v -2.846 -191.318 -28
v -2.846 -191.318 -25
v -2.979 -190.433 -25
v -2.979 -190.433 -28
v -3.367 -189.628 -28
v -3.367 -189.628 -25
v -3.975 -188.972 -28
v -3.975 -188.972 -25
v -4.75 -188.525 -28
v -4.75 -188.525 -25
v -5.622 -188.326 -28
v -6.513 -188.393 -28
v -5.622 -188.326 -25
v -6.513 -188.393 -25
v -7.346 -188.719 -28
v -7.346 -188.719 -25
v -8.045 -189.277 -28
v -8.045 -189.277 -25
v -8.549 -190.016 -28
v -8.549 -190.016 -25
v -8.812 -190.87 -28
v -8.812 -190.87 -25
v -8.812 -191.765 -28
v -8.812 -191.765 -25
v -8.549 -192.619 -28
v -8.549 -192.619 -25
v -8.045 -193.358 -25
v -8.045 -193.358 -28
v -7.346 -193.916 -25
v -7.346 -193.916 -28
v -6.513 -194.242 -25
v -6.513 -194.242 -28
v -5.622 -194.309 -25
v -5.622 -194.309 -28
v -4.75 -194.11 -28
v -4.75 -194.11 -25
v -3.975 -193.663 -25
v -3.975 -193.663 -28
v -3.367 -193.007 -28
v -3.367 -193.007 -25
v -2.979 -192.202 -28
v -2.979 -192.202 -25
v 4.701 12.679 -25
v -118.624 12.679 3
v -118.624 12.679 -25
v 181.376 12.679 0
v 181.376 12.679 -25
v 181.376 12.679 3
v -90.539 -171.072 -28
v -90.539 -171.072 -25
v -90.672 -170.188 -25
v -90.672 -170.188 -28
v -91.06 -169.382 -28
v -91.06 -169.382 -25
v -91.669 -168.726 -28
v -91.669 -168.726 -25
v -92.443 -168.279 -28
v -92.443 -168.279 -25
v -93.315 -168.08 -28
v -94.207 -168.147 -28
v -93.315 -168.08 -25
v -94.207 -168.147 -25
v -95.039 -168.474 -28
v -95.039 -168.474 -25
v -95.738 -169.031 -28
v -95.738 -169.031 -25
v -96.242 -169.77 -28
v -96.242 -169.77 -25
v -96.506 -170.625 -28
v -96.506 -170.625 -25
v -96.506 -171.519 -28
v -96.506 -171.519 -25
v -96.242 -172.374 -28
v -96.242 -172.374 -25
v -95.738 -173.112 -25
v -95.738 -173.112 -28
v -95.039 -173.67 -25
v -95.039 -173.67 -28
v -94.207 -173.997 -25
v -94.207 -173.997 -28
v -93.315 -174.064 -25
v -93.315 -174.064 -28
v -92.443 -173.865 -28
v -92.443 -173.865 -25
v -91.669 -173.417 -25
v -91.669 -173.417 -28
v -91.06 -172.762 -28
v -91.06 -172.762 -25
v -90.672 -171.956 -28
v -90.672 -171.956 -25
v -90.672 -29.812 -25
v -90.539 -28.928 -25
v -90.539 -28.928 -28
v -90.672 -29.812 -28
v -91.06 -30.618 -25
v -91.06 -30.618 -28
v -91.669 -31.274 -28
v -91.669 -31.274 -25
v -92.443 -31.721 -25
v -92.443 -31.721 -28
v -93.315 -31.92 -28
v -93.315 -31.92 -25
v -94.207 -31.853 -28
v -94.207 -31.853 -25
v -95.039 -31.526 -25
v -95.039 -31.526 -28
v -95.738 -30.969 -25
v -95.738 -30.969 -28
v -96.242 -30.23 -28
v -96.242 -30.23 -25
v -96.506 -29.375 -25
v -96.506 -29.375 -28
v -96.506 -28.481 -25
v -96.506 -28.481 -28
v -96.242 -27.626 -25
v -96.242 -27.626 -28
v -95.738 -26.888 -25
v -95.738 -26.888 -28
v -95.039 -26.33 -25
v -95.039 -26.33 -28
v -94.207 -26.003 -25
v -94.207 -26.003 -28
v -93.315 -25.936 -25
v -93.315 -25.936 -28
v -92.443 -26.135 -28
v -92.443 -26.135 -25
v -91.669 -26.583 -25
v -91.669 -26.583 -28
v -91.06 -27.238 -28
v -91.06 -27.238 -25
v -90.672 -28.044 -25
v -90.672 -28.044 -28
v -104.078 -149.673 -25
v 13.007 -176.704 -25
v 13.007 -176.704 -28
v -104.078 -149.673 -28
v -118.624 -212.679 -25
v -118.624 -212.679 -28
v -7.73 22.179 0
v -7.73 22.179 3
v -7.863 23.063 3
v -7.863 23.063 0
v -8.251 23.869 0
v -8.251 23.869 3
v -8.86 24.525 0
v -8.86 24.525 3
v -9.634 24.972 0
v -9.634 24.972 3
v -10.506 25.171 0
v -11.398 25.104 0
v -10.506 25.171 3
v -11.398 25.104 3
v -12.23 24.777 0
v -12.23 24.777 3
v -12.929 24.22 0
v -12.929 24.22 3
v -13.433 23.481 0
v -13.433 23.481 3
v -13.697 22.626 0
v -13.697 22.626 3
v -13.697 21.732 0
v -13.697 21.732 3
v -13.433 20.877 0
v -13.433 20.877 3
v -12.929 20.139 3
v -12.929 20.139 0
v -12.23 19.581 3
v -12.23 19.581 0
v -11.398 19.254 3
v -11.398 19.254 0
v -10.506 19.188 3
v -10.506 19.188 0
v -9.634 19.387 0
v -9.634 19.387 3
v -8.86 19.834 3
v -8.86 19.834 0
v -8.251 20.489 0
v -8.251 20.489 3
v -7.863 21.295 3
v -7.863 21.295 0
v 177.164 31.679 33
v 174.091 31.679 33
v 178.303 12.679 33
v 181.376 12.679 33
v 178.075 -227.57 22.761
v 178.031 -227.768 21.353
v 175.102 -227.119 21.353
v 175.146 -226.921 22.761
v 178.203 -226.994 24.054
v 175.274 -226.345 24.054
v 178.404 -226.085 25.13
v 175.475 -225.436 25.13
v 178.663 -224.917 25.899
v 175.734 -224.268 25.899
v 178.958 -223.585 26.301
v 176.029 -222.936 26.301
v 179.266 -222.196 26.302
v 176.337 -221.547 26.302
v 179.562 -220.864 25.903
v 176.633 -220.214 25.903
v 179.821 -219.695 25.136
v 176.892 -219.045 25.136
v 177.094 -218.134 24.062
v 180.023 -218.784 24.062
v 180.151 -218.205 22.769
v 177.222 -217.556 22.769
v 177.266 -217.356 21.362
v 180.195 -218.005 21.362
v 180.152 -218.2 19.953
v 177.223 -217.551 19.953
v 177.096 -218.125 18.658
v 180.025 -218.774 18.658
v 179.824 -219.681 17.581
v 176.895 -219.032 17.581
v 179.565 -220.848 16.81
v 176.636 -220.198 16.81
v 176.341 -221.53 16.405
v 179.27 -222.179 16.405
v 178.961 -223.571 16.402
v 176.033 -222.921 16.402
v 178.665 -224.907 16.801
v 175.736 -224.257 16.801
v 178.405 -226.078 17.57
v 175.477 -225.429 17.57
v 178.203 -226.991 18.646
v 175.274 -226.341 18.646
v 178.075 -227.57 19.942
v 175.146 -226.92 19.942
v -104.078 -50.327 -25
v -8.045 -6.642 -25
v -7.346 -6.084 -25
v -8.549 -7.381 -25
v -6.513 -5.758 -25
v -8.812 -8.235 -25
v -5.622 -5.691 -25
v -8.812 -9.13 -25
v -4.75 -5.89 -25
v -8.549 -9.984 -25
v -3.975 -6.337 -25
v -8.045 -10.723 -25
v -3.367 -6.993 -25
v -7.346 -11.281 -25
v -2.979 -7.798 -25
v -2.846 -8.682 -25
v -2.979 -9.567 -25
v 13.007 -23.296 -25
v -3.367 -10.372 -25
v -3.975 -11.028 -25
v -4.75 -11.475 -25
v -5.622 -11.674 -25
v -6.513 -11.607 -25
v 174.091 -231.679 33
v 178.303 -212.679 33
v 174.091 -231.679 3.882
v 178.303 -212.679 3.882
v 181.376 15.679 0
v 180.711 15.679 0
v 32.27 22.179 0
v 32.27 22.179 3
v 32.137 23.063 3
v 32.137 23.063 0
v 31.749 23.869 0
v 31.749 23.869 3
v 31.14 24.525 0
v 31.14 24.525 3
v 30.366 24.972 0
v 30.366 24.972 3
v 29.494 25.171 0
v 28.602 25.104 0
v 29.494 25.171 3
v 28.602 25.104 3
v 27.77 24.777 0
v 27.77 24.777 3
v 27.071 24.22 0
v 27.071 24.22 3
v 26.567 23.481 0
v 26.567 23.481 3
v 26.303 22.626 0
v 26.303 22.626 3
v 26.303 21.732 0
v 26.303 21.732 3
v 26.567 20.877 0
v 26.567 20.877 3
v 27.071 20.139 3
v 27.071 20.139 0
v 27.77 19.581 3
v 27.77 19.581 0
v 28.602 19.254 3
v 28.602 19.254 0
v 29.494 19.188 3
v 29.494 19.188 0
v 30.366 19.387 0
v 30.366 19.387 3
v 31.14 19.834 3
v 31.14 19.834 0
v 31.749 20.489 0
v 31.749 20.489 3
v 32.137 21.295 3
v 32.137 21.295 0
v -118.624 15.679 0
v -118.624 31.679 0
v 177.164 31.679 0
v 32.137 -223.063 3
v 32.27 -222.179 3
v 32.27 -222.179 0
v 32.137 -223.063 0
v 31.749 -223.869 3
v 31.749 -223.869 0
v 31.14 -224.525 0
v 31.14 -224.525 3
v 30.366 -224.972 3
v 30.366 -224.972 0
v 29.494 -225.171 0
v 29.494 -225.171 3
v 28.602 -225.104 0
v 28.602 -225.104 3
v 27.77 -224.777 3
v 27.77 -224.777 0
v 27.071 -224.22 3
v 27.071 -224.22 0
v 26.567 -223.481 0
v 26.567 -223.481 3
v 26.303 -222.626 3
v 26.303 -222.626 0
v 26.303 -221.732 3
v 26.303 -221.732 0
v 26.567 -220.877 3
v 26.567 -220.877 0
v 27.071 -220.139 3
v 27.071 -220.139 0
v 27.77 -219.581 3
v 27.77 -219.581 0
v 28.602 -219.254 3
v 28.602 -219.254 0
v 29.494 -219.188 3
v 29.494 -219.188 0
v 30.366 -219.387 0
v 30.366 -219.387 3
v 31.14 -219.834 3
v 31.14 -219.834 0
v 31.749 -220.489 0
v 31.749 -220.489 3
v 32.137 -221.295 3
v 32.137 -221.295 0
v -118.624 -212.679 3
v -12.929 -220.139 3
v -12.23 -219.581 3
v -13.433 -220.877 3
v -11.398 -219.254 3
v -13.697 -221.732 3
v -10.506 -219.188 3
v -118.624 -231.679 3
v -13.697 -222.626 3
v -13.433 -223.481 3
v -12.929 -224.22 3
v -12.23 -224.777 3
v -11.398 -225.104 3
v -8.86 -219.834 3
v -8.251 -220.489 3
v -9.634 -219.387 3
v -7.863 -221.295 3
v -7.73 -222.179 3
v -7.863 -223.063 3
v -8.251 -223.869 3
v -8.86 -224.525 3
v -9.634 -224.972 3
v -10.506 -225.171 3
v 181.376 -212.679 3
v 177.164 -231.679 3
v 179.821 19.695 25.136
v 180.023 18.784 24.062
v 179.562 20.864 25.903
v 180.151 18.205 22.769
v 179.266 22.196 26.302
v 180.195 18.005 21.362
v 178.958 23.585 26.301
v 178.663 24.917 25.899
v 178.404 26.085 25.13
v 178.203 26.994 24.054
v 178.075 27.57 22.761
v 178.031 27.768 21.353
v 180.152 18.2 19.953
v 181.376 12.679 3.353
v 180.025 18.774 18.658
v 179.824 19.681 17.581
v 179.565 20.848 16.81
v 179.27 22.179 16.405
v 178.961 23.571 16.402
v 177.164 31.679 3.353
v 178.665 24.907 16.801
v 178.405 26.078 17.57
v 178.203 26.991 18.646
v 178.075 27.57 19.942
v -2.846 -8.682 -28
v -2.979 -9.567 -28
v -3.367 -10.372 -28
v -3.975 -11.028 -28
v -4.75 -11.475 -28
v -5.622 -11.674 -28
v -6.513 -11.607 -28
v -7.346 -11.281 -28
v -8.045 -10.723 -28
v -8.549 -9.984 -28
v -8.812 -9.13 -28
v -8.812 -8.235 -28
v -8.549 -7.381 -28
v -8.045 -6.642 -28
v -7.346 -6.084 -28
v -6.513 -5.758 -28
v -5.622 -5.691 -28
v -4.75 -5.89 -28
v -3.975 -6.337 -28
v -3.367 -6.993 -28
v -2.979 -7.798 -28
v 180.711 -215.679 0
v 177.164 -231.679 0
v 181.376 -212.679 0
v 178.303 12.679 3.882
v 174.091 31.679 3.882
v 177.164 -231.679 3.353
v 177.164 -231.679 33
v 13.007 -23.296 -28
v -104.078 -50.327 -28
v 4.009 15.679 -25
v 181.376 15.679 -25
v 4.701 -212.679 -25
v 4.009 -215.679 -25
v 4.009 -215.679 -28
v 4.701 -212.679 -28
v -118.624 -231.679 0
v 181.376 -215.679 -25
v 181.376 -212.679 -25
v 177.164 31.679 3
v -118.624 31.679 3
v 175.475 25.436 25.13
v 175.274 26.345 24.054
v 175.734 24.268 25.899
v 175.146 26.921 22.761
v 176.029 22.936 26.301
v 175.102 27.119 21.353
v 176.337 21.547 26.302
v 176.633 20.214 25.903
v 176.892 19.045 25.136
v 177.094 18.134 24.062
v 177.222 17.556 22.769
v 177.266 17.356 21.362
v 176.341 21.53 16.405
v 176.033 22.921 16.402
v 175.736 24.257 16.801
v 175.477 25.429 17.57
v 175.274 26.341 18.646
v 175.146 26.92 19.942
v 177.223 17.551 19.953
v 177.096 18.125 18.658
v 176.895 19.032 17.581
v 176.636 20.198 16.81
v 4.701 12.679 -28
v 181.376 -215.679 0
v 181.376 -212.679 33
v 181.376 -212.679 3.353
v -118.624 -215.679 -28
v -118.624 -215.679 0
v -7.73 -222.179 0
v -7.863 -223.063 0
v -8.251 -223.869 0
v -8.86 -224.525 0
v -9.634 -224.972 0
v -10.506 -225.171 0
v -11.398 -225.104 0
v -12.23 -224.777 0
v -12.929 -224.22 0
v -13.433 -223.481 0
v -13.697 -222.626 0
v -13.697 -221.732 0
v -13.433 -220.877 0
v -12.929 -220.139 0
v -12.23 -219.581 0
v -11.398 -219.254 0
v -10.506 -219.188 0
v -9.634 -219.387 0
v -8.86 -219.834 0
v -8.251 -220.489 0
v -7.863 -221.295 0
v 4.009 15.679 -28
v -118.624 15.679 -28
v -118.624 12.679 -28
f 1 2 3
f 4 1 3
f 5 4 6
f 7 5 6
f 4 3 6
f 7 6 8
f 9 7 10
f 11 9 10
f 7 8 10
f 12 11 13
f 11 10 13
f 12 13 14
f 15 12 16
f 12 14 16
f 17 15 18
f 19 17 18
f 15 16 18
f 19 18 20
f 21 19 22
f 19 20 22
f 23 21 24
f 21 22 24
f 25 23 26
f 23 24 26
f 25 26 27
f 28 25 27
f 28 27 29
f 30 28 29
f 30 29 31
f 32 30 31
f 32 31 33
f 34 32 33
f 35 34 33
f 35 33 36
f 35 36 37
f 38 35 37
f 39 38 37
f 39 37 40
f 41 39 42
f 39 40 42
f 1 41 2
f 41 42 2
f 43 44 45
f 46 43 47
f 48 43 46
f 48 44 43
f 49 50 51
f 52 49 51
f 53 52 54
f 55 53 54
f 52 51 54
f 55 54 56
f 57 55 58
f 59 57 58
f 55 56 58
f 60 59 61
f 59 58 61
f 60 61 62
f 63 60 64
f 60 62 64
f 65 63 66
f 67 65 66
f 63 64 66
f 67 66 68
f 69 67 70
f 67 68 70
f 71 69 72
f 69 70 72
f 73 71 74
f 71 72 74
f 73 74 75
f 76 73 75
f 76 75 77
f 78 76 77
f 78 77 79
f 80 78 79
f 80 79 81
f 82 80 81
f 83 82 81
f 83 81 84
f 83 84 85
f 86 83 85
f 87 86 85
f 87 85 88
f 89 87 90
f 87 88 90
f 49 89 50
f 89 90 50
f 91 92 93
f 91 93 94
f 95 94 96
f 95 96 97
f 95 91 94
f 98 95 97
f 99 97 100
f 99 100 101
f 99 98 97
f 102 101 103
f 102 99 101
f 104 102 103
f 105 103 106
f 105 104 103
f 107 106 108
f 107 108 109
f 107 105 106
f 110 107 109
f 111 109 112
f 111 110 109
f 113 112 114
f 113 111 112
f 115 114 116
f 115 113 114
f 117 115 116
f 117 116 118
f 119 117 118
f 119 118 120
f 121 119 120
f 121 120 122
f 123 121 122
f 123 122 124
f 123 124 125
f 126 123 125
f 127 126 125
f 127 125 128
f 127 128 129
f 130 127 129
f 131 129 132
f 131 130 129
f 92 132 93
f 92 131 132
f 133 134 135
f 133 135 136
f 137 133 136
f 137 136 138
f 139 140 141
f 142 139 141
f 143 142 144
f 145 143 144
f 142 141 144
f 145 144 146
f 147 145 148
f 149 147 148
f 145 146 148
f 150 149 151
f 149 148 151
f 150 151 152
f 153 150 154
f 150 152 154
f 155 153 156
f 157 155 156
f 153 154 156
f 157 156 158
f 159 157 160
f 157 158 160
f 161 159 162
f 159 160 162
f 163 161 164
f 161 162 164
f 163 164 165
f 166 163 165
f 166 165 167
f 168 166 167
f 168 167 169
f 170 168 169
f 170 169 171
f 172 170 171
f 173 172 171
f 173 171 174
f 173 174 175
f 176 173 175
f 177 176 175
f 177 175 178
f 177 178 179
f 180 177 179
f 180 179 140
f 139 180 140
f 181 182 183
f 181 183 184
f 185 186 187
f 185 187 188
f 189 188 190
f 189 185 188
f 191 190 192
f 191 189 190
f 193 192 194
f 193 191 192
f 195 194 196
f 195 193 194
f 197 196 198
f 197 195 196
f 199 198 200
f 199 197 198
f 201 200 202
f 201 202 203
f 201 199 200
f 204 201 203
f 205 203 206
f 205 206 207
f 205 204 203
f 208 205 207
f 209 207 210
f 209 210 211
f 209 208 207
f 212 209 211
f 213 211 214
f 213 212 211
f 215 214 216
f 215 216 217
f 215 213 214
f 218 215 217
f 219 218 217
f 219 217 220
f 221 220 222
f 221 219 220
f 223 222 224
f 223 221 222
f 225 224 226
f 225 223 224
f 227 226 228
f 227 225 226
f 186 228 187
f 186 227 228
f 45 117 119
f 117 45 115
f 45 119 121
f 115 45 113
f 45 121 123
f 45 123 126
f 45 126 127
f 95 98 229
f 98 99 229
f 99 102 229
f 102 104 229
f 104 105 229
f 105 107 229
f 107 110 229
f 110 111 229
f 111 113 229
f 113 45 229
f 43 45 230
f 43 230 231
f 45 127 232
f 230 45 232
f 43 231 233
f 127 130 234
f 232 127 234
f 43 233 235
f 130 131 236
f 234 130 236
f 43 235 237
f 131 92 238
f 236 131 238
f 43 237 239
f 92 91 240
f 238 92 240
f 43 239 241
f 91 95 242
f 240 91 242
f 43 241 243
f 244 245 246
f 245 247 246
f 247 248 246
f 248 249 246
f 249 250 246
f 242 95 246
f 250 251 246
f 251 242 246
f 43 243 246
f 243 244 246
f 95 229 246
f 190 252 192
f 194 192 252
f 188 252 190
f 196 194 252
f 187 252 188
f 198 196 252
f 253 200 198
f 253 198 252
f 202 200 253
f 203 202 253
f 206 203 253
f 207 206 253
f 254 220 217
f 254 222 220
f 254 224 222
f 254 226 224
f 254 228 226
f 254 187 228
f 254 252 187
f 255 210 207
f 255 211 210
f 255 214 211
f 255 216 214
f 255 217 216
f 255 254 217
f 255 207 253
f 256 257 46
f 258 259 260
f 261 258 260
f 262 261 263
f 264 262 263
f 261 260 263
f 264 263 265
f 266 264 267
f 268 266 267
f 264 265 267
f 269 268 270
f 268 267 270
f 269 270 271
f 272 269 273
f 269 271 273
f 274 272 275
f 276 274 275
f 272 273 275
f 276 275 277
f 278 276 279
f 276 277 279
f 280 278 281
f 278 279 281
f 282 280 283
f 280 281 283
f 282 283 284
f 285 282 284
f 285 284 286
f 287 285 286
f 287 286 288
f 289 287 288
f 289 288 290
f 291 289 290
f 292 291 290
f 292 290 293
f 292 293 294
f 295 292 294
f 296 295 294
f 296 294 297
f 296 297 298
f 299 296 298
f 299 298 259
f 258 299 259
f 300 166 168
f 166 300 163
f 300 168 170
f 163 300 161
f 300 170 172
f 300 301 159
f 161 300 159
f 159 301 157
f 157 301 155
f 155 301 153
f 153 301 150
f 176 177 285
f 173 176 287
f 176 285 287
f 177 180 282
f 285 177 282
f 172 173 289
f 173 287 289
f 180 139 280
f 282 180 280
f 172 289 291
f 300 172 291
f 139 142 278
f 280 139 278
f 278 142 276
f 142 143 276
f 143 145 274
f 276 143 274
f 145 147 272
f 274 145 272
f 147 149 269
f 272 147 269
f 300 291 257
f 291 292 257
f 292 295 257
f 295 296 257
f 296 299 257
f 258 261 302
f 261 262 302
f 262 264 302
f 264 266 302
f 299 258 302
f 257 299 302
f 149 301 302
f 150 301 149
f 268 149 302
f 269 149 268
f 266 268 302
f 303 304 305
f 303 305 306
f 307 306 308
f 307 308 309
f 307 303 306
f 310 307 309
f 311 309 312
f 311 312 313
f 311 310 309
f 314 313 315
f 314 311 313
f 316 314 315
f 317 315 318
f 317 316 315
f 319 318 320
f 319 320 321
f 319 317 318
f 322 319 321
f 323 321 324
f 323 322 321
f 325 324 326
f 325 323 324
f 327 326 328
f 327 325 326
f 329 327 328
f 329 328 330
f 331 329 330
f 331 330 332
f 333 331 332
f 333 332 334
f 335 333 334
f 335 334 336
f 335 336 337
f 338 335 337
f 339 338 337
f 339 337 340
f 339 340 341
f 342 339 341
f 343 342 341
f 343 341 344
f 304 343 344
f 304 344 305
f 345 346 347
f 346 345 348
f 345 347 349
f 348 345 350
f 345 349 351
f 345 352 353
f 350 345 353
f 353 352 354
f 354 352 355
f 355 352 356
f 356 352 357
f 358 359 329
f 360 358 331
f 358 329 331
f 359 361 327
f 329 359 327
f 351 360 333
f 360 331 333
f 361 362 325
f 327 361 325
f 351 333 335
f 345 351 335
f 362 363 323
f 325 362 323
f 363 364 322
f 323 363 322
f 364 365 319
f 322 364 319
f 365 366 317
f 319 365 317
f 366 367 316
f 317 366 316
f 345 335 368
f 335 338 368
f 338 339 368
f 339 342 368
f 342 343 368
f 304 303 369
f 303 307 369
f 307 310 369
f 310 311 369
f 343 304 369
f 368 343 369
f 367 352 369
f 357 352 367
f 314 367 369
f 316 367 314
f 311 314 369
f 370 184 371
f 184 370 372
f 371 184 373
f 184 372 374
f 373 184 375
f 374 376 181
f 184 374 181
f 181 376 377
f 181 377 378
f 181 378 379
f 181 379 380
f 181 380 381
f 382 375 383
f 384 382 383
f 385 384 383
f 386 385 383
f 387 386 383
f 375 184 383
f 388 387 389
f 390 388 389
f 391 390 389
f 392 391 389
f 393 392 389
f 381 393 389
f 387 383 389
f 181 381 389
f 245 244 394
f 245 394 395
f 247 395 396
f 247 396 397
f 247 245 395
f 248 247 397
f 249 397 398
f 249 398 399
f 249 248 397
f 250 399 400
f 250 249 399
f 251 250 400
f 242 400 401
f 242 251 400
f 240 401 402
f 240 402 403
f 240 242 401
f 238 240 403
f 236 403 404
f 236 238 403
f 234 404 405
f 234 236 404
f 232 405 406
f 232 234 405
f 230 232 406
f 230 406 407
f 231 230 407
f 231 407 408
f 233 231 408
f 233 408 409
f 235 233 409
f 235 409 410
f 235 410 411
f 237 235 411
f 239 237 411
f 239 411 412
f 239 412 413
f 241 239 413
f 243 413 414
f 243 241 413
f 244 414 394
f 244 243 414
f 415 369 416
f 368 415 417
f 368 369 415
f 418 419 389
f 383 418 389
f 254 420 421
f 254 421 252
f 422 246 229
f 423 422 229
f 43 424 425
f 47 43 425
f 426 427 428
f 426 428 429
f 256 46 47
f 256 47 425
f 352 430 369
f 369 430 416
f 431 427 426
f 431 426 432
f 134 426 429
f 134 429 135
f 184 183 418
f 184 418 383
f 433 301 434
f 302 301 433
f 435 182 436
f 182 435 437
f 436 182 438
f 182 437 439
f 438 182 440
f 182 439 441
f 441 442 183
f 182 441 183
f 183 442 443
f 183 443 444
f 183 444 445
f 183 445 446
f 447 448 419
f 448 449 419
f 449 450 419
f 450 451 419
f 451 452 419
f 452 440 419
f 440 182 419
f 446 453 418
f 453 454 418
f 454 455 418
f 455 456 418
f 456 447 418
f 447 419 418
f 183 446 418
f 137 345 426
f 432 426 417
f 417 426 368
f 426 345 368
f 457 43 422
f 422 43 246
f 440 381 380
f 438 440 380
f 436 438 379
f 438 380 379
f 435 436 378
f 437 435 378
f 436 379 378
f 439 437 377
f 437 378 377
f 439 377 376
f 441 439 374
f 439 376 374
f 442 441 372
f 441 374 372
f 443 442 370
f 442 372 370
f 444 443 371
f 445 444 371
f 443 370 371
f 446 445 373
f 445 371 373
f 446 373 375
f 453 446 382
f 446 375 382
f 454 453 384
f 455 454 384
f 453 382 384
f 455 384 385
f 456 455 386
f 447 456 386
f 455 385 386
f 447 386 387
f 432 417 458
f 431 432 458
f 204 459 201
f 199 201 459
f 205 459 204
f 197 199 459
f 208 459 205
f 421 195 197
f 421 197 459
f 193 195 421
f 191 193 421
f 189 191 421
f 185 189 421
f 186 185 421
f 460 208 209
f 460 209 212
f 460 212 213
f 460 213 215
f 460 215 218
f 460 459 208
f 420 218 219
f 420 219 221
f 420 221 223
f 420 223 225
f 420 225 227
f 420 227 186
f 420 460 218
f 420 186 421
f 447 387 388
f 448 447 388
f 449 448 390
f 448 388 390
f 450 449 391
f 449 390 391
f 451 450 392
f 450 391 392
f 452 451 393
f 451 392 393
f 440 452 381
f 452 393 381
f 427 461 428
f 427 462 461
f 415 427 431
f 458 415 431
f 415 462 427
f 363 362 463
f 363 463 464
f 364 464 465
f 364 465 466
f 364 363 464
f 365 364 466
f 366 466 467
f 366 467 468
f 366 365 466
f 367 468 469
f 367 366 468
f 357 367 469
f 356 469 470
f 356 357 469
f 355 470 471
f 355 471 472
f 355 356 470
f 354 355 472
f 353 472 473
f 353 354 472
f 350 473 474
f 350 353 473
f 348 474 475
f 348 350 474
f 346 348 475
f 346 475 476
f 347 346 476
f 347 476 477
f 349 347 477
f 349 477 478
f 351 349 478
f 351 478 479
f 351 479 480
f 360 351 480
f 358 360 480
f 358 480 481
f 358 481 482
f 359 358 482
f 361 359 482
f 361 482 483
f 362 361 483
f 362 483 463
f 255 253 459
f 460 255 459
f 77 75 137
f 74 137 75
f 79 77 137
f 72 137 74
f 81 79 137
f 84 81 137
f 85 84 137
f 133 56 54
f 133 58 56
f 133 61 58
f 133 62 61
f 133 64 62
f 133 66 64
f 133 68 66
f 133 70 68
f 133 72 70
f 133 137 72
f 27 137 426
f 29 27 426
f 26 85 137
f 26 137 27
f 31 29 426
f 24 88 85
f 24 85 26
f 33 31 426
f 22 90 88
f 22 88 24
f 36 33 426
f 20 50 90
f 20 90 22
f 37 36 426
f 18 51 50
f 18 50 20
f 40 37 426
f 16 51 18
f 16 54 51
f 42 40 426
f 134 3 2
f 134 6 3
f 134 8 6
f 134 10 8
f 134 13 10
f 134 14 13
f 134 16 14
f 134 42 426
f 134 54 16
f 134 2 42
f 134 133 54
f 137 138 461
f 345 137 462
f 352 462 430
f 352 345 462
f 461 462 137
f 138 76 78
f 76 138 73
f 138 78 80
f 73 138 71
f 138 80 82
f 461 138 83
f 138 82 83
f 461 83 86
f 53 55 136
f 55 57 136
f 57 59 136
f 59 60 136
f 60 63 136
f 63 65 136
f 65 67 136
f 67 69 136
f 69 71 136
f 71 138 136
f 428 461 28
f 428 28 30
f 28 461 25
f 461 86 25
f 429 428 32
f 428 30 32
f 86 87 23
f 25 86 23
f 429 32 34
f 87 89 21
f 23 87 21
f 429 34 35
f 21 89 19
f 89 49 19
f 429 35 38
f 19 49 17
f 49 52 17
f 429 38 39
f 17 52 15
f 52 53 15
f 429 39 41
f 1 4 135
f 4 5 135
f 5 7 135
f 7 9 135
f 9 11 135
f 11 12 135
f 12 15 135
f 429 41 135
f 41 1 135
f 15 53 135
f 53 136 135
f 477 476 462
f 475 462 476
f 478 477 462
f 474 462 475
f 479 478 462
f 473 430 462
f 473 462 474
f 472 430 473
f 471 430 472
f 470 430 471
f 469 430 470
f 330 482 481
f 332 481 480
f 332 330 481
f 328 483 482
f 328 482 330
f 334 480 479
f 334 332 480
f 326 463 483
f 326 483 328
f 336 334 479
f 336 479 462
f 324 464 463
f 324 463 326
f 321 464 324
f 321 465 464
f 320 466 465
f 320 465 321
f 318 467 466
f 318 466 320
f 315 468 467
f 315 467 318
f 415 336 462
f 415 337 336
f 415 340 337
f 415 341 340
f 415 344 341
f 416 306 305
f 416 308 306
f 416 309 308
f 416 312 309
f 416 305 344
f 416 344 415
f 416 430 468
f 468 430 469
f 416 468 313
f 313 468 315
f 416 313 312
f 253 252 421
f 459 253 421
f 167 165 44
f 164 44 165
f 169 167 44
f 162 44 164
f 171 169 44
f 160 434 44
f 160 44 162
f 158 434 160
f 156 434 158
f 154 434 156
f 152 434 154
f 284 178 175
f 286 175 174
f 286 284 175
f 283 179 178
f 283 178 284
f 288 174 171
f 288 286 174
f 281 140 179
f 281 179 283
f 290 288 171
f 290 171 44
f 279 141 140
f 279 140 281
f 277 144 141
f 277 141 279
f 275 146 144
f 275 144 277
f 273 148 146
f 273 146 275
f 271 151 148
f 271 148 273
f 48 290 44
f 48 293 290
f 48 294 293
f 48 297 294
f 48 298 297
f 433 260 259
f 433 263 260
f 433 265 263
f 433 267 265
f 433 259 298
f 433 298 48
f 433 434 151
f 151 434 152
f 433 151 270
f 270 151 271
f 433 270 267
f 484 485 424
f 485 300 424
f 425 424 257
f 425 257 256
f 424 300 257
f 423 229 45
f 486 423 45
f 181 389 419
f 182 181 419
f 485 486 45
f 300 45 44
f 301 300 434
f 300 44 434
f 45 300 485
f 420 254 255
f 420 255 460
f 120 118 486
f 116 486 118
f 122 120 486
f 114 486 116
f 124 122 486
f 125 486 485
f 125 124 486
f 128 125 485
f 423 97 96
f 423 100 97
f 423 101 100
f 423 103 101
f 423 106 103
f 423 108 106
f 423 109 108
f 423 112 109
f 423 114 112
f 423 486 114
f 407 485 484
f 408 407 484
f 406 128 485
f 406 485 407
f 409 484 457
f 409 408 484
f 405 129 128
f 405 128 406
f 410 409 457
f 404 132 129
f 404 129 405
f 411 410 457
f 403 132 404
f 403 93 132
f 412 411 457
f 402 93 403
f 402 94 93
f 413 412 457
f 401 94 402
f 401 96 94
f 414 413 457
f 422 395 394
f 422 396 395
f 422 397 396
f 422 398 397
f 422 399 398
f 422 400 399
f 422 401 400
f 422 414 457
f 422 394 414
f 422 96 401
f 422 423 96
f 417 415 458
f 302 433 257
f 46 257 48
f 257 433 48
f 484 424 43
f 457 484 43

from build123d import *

# Parameters (mm, degrees)
F0_W        = 300
F0_H        = 16
F0_H_2      = 3
F1_DEPTH    = 3
F3_DEPTH    = 3.001
F5_DEPTH    = 30
F6_T1_DEPTH = 45.4466987362
F8_DEPTH    = 292.889802136
F10_DEPTH   = 25
F11_R       = 3
F12_DEPTH   = 3
F4_R        = 3
F13_DEPTH   = 31.001


# Not quite as in the source:
# - a fillet or chamfer that OpenCascade refuses, or shapes differently, is made with other operations: its cross-section is extruded or revolved along the edge and cut away or added


with BuildPart() as f1:
    # F0 (on Top) → F1 (new body)
    with BuildSketch(Plane.XY):
        with Locations((31.376008536, 23.679145366)):
            Rectangle(F0_W, F0_H)
        with Locations((31.376008536, 14.179145366)):
            Rectangle(F0_W, F0_H_2)
    extrude(amount=F1_DEPTH)

    # F2 (on face) → F3 (cut, through all)
    with BuildSketch(Plane.XY.offset(3)):
        Polygon((181.376008536, 31.679145366), (177.1638099458, 31.679145366), (181.376008536, 12.679145366), align=None)
    extrude(amount=-F3_DEPTH, mode=Mode.SUBTRACT)

    # F0 (on Top) → F10 (join)
    with BuildSketch(Plane.XY):
        with Locations((31.376008536, 14.179145366)):
            Rectangle(F0_W, F0_H_2)
    extrude(amount=-F10_DEPTH)

    # F11 (on face) → F12 (join)
    with BuildSketch(Plane(origin=(0, 0, -25), x_dir=(1, 0, 0), z_dir=(0, 0, -1))):
        Polygon((-104.0779183868, 50.3268192335), (-118.623991464, -12.679145366), (4.7014701045, -12.679145366), (13.0069077049, 23.2956572255), align=None)
        with Locations((-5.8458569022, 8.6824761846)):
            Circle(F11_R, mode=Mode.SUBTRACT)
        with Locations((-93.5391627328, 28.9280710755)):
            Circle(F11_R, mode=Mode.SUBTRACT)
        Polygon((4.7014701045, -12.679145366), (-118.623991464, -12.679145366), (-118.623991464, -15.679145366), (4.0088655312, -15.679145366), align=None)
    extrude(amount=F12_DEPTH)

    # F4 (on face) → F13 (cut, through all)
    with BuildSketch(Plane.XY.offset(3)):
        with Locations((29.2699092409, 22.179145366)):
            Circle(F4_R)
        with Locations((-10.7300907591, 22.179145366)):
            Circle(F4_R)
    extrude(amount=-F13_DEPTH, mode=Mode.SUBTRACT)


with BuildPart() as f5:
    # F4 (on face) → F5 (new body)
    with BuildSketch(Plane.XY.offset(3)):
        Polygon((177.1638099458, 31.679145366), (174.0909714028, 31.679145366), (178.3031699931, 12.679145366), (181.376008536, 12.679145366), align=None)
    extrude(amount=F5_DEPTH)

    # F6: chamfer of 5 x 0.8816349035 on 1 edges, made by hand

    # F6_s2 → F6_t1 (cut)
    with BuildSketch(Plane(origin=(-1.3507421597, 6.0928041458, 0), x_dir=(0, 0, 1), z_dir=(0.2164396139, -0.9762960071, 0))):
        Polygon((3.8816349035, -176.8209422491), (3, -181.8209422491), (3, -176.8209422491), align=None)
    extrude(amount=F6_T1_DEPTH, mode=Mode.SUBTRACT)

    # F7 (on face) → F8 (cut, through all)
    with BuildSketch(Plane(origin=(175.5584679144, 38.9203753184, 0), x_dir=(-0.2164396139, 0.9762960071, 0), z_dir=(0.9762960071, 0.2164396139, 0))):
        with BuildLine():
            ThreePointArc((-11.4232179523, 21.3526539614), (-19.6925906243, 25.1356689404), (-17.1476988847, 16.4054196453))
            ThreePointArc((-17.1476988847, 16.4054196453), (-13.1538452802, 17.5696389824), (-11.4232179523, 21.3526539614))
        make_face()
    extrude(amount=-F8_DEPTH, mode=Mode.SUBTRACT)


with BuildPart() as f14_1:
    # F14: instance of F1
    add(f1.part.mirror(Plane.XZ.offset(100)))


with BuildPart() as f14_2:
    # F14: instance of F5
    add(f5.part.mirror(Plane.XZ.offset(100)))


solid = Compound([f1.part, f5.part, f14_1.part, f14_2.part])
